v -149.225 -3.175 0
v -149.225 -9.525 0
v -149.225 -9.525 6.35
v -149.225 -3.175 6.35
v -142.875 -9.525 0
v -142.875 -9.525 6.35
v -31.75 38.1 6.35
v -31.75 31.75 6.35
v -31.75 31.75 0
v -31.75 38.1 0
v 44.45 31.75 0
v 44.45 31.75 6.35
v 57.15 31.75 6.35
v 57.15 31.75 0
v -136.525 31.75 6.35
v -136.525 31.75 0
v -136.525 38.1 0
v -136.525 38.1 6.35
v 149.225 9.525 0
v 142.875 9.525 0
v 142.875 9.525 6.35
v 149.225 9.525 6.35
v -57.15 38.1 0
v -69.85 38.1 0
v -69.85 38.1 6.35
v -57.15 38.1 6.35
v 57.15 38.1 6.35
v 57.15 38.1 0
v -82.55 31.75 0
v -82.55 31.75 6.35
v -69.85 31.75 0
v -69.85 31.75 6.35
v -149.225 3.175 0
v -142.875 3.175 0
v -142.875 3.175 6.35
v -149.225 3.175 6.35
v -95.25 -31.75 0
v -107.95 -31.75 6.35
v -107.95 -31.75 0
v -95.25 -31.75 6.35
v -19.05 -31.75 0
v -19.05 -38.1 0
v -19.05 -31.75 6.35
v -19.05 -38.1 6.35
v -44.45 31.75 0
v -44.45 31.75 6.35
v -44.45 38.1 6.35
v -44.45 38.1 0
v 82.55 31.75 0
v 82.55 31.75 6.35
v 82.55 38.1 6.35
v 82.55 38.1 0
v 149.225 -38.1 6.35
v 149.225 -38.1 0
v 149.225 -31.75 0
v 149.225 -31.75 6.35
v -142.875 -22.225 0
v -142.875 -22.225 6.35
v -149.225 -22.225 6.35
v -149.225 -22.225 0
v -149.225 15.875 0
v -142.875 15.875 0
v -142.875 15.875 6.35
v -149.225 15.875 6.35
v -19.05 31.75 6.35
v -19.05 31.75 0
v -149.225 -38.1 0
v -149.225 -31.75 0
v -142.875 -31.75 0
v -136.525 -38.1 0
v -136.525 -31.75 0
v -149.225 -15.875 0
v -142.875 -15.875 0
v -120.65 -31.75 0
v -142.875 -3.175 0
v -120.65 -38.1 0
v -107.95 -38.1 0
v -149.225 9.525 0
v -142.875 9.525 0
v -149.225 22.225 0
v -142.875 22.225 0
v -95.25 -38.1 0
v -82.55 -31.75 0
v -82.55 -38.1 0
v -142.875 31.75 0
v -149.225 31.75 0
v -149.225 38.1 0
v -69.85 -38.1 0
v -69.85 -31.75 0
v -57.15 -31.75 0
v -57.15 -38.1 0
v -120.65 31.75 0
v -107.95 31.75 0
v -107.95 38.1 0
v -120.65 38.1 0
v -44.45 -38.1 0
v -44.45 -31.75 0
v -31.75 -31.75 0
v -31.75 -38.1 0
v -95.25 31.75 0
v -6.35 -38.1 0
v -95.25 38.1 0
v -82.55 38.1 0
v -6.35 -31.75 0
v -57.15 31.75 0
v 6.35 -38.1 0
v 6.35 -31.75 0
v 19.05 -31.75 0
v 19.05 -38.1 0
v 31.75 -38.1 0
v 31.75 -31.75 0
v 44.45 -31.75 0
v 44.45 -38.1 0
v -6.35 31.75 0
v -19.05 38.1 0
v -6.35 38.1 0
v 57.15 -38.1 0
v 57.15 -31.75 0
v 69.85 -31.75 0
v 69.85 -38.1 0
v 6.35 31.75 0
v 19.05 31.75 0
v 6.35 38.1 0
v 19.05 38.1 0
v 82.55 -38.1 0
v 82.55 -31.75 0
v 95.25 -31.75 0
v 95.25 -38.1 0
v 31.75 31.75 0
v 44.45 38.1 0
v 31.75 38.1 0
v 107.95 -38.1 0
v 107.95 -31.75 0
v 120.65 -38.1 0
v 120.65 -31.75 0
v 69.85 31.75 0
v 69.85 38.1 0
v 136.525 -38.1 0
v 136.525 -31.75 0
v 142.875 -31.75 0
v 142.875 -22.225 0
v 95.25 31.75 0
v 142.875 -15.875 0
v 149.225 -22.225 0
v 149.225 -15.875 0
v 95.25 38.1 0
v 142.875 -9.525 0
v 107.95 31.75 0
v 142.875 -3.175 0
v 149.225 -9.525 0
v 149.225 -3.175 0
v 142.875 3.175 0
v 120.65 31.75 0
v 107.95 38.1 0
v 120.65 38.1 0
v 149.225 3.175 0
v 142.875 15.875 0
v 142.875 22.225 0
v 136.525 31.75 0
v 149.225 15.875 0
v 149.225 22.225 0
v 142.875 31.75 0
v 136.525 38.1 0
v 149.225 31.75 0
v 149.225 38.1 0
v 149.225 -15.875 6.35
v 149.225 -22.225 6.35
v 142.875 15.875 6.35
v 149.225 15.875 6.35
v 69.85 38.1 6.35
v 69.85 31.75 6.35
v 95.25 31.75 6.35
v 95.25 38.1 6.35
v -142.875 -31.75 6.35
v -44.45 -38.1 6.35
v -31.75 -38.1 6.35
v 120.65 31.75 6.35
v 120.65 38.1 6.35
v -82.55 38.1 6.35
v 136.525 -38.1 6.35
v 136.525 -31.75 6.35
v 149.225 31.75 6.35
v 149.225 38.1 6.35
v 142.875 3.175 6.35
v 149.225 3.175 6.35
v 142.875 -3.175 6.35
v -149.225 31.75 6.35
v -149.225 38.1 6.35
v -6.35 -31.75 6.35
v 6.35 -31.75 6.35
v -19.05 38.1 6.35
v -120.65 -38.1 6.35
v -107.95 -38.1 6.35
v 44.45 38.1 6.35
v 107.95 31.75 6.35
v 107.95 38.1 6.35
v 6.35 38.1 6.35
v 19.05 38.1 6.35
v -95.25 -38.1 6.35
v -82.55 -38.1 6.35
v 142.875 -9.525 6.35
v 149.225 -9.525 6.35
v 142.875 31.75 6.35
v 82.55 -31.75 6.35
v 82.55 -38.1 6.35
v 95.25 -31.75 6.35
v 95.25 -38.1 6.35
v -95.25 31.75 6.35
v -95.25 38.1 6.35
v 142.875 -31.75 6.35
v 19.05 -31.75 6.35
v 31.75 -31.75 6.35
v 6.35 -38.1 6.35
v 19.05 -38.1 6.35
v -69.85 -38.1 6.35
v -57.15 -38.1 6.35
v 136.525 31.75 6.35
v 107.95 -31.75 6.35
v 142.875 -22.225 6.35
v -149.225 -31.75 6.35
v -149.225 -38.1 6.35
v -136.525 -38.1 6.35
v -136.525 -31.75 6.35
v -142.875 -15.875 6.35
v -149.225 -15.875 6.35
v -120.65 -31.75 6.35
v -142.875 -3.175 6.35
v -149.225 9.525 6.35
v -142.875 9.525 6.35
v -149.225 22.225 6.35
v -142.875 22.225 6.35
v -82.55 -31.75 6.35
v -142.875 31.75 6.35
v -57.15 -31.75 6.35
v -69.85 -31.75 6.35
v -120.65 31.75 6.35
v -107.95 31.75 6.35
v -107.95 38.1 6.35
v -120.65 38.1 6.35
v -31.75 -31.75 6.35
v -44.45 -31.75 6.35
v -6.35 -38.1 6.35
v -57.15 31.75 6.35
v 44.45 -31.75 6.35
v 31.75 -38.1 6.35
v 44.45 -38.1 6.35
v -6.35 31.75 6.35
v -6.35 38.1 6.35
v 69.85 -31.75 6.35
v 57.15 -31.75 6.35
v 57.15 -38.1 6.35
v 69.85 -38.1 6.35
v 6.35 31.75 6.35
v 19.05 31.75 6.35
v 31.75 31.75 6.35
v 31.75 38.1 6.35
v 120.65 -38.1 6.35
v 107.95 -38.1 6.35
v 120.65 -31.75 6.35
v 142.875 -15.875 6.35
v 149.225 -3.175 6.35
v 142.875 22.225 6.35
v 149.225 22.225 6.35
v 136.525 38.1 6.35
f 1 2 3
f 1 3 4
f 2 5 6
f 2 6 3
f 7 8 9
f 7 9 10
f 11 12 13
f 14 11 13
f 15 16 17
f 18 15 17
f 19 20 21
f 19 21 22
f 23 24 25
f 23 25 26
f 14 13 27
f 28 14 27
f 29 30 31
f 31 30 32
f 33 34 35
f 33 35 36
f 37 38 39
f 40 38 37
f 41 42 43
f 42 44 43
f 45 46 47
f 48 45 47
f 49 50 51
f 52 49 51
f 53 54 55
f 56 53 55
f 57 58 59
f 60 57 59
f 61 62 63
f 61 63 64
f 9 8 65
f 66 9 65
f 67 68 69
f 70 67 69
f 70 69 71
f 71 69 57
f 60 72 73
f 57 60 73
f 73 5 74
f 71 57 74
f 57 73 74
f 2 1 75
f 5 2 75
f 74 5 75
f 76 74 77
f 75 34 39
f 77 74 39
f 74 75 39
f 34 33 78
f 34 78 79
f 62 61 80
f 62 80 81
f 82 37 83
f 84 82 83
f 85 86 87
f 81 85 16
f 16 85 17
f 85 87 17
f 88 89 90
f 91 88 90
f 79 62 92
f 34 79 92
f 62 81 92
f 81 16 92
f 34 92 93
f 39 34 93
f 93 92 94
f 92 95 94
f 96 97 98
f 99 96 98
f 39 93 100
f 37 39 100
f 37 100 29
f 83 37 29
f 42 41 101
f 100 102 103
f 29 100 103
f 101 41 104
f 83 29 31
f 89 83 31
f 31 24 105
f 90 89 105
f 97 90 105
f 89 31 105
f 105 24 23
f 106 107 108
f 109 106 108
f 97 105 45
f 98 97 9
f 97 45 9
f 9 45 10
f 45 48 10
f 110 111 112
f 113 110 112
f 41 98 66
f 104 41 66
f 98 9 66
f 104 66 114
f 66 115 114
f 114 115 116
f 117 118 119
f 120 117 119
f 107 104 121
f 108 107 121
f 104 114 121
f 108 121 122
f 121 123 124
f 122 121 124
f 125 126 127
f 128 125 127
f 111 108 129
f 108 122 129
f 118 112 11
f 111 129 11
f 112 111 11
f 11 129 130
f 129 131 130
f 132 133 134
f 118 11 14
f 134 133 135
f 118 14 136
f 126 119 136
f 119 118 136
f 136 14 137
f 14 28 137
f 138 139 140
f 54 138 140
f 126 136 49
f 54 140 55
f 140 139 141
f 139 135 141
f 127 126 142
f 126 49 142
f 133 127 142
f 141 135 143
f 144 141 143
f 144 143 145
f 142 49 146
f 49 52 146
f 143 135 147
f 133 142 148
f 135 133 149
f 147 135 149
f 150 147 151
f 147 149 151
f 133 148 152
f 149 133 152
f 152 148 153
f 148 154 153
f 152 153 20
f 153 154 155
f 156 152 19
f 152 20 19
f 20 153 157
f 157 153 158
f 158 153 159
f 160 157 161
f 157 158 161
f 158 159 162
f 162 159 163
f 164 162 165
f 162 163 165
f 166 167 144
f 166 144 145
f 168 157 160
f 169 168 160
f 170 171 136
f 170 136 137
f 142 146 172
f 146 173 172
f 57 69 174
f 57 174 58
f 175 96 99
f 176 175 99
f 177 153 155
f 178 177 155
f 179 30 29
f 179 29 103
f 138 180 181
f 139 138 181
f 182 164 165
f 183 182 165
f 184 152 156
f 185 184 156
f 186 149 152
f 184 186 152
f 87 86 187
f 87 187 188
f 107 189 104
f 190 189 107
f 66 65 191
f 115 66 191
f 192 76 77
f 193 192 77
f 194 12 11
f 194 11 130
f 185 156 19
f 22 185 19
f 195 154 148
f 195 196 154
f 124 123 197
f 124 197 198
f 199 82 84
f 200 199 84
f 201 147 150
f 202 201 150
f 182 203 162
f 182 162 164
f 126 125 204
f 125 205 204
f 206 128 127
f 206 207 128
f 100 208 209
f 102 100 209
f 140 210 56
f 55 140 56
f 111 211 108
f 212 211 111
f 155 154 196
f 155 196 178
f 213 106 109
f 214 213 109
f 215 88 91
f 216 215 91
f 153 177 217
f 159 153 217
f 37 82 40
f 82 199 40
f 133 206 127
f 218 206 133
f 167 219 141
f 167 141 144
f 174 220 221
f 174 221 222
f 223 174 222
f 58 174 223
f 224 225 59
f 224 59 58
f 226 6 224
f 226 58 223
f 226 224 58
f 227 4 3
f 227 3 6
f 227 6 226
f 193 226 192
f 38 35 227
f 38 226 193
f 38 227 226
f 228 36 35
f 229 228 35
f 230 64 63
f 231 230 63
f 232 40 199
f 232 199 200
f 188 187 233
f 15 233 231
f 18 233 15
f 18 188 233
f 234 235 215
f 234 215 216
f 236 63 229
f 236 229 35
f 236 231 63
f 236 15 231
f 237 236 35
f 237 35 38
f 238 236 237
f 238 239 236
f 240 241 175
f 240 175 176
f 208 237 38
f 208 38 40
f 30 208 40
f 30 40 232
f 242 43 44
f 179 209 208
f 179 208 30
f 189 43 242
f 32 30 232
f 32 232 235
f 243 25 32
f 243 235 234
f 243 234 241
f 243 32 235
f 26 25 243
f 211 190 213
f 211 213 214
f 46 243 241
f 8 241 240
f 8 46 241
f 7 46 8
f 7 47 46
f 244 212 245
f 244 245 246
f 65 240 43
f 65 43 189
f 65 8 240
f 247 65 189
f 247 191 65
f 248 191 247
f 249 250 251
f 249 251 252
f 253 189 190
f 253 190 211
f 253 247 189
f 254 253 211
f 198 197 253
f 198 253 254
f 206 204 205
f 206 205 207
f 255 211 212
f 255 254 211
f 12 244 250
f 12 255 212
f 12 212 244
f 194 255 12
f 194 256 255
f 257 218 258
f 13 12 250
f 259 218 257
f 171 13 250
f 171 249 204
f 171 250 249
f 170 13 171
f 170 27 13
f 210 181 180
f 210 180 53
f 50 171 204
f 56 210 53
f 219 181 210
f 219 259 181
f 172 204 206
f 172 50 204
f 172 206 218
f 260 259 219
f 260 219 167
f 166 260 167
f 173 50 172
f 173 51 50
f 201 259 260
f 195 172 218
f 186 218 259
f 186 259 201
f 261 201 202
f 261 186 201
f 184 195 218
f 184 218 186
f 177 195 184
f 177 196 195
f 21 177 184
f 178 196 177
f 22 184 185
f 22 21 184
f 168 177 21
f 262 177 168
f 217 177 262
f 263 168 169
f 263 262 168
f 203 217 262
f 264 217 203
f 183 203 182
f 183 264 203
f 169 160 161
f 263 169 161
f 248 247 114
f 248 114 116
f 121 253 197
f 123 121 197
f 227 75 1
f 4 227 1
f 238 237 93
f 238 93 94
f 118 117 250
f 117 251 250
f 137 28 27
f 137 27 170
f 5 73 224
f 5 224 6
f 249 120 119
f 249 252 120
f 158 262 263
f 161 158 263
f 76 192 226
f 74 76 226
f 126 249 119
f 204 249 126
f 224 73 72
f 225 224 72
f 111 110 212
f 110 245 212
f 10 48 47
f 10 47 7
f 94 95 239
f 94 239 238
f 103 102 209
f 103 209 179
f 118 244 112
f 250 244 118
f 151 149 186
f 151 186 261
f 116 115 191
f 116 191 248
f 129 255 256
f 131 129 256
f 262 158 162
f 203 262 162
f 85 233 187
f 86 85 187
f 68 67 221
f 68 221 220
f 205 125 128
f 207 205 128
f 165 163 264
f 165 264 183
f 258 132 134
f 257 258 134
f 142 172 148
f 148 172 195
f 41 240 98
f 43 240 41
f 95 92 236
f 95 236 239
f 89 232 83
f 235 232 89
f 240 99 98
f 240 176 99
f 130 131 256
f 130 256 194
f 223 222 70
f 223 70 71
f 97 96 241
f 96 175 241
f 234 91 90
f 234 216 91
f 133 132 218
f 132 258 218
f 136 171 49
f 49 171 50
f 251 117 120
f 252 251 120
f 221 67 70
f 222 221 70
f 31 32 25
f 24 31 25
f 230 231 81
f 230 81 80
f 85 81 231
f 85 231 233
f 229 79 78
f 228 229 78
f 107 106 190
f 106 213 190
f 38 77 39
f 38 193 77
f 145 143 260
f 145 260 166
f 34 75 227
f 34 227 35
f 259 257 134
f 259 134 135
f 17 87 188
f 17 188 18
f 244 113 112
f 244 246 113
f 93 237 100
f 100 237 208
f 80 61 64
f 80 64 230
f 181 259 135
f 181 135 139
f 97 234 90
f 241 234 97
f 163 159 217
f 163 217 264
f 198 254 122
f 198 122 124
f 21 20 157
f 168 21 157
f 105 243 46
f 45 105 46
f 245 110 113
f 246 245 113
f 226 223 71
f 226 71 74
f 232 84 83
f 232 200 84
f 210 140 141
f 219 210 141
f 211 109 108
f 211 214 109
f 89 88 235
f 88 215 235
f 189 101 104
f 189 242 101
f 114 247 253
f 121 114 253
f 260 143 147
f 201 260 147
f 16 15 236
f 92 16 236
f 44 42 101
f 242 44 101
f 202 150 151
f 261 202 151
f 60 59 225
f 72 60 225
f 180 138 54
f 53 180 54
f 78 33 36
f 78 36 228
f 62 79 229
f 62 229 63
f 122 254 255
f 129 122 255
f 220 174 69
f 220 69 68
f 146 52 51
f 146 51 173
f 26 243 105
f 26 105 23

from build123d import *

# Parameters (mm, degrees)
SKETCH1_W               = 298.45
SKETCH1_H               = 76.2
BOSS_EXTRUDE1_DEPTH     = 6.35
SKETCH2_W               = 12.7
SKETCH2_H               = 25.4
CUT_EXTRUDE5_DEPTH      = 155.142898393
LPATTERN1_COUNT         = 9
LPATTERN1_PITCH         = 25.4
MIRROR1_COPY_1_SKETCH_W = 12.7
MIRROR1_COPY_1_SKETCH_H = 25.4
MIRROR1_COPY_1_DEPTH    = 155.142898393
MIRROR1_COPY_2_SKETCH_W = 12.7
MIRROR1_COPY_2_SKETCH_H = 25.4
MIRROR1_COPY_2_DEPTH    = 155.142898393
MIRROR1_COPY_3_SKETCH_W = 12.7
MIRROR1_COPY_3_SKETCH_H = 25.4
MIRROR1_COPY_3_DEPTH    = 155.142898393
MIRROR1_COPY_4_SKETCH_W = 12.7
MIRROR1_COPY_4_SKETCH_H = 25.4
MIRROR1_COPY_4_DEPTH    = 155.142898393
MIRROR1_COPY_5_SKETCH_W = 12.7
MIRROR1_COPY_5_SKETCH_H = 25.4
MIRROR1_COPY_5_DEPTH    = 155.142898393
MIRROR1_COPY_6_SKETCH_W = 12.7
MIRROR1_COPY_6_SKETCH_H = 25.4
MIRROR1_COPY_6_DEPTH    = 155.142898393
MIRROR1_COPY_7_SKETCH_W = 12.7
MIRROR1_COPY_7_SKETCH_H = 25.4
MIRROR1_COPY_7_DEPTH    = 155.142898393
MIRROR1_COPY_8_SKETCH_W = 12.7
MIRROR1_COPY_8_SKETCH_H = 25.4
MIRROR1_COPY_8_DEPTH    = 155.142898393
SKETCH3_W               = 40.748476415
SKETCH3_H               = 6.35
SKETCH3_W_2             = 25.4
SKETCH3_H_2             = 9.525
CUT_EXTRUDE7_DEPTH      = 155.142898393
SKETCH4_W               = 15.875
SKETCH4_H               = 25.4
CUT_EXTRUDE8_DEPTH      = 155.142898393


with BuildPart() as part:
    # Sketch1 → Boss-Extrude1 (new body)
    with BuildSketch(Plane.XY):
        Rectangle(SKETCH1_W, SKETCH1_H)
    extrude(amount=BOSS_EXTRUDE1_DEPTH)

    # Sketch2 → Cut-Extrude5 (cut, symmetric)
    with BuildSketch(Plane.XY):
        with Locations((101.6, -44.45)):
            Rectangle(SKETCH2_W, SKETCH2_H)
    cut_extrude5 = extrude(amount=CUT_EXTRUDE5_DEPTH, both=True, mode=Mode.SUBTRACT)

    # LPattern1: Cut-Extrude5 ×9
    with Locations(*[(-i * LPATTERN1_PITCH, 0, 0) for i in range(1, LPATTERN1_COUNT)]):
        add(cut_extrude5, mode=Mode.SUBTRACT)

    # Mirror1: Cut-Extrude5 across plane
    add(cut_extrude5.mirror(Plane.ZX), mode=Mode.SUBTRACT)

    # Mirror1 copy 1 sketch → Mirror1 copy 1 (cut, symmetric)
    with BuildSketch(Plane(origin=(-25.4, 0, 0), x_dir=(1, 0, 0), z_dir=(0, 0, 1))):
        with Locations((101.6, 44.45)):
            Rectangle(MIRROR1_COPY_1_SKETCH_W, MIRROR1_COPY_1_SKETCH_H)
    extrude(amount=MIRROR1_COPY_1_DEPTH, both=True, mode=Mode.SUBTRACT)

    # Mirror1 copy 2 sketch → Mirror1 copy 2 (cut, symmetric)
    with BuildSketch(Plane(origin=(-50.8, 0, 0), x_dir=(1, 0, 0), z_dir=(0, 0, 1))):
        with Locations((101.6, 44.45)):
            Rectangle(MIRROR1_COPY_2_SKETCH_W, MIRROR1_COPY_2_SKETCH_H)
    extrude(amount=MIRROR1_COPY_2_DEPTH, both=True, mode=Mode.SUBTRACT)

    # Mirror1 copy 3 sketch → Mirror1 copy 3 (cut, symmetric)
    with BuildSketch(Plane(origin=(-76.2, 0, 0), x_dir=(1, 0, 0), z_dir=(0, 0, 1))):
        with Locations((101.6, 44.45)):
            Rectangle(MIRROR1_COPY_3_SKETCH_W, MIRROR1_COPY_3_SKETCH_H)
    extrude(amount=MIRROR1_COPY_3_DEPTH, both=True, mode=Mode.SUBTRACT)

    # Mirror1 copy 4 sketch → Mirror1 copy 4 (cut, symmetric)
    with BuildSketch(Plane(origin=(-101.6, 0, 0), x_dir=(1, 0, 0), z_dir=(0, 0, 1))):
        with Locations((101.6, 44.45)):
            Rectangle(MIRROR1_COPY_4_SKETCH_W, MIRROR1_COPY_4_SKETCH_H)
    extrude(amount=MIRROR1_COPY_4_DEPTH, both=True, mode=Mode.SUBTRACT)

    # Mirror1 copy 5 sketch → Mirror1 copy 5 (cut, symmetric)
    with BuildSketch(Plane(origin=(-127, 0, 0), x_dir=(1, 0, 0), z_dir=(0, 0, 1))):
        with Locations((101.6, 44.45)):
            Rectangle(MIRROR1_COPY_5_SKETCH_W, MIRROR1_COPY_5_SKETCH_H)
    extrude(amount=MIRROR1_COPY_5_DEPTH, both=True, mode=Mode.SUBTRACT)

    # Mirror1 copy 6 sketch → Mirror1 copy 6 (cut, symmetric)
    with BuildSketch(Plane(origin=(-152.4, 0, 0), x_dir=(1, 0, 0), z_dir=(0, 0, 1))):
        with Locations((101.6, 44.45)):
            Rectangle(MIRROR1_COPY_6_SKETCH_W, MIRROR1_COPY_6_SKETCH_H)
    extrude(amount=MIRROR1_COPY_6_DEPTH, both=True, mode=Mode.SUBTRACT)

    # Mirror1 copy 7 sketch → Mirror1 copy 7 (cut, symmetric)
    with BuildSketch(Plane(origin=(-177.8, 0, 0), x_dir=(1, 0, 0), z_dir=(0, 0, 1))):
        with Locations((101.6, 44.45)):
            Rectangle(MIRROR1_COPY_7_SKETCH_W, MIRROR1_COPY_7_SKETCH_H)
    extrude(amount=MIRROR1_COPY_7_DEPTH, both=True, mode=Mode.SUBTRACT)

    # Mirror1 copy 8 sketch → Mirror1 copy 8 (cut, symmetric)
    with BuildSketch(Plane(origin=(-203.2, 0, 0), x_dir=(1, 0, 0), z_dir=(0, 0, 1))):
        with Locations((101.6, 44.45)):
            Rectangle(MIRROR1_COPY_8_SKETCH_W, MIRROR1_COPY_8_SKETCH_H)
    extrude(amount=MIRROR1_COPY_8_DEPTH, both=True, mode=Mode.SUBTRACT)

    # Sketch3 → Cut-Extrude7 (cut, through all)
    with BuildSketch(Plane.XY):
        with Locations((163.249238208, 12.7)):
            Rectangle(SKETCH3_W, SKETCH3_H)
        with Locations((163.249238208, 0)):
            Rectangle(SKETCH3_W, SKETCH3_H)
        with Locations((163.249238208, -12.7)):
            Rectangle(SKETCH3_W, SKETCH3_H)
        with Locations((155.575, 26.9875)):
            Rectangle(SKETCH3_W_2, SKETCH3_H_2)
        with Locations((155.575, -26.9875)):
            Rectangle(SKETCH3_W_2, SKETCH3_H_2)
    cut_extrude7 = extrude(amount=CUT_EXTRUDE7_DEPTH, mode=Mode.SUBTRACT)

    # Mirror2: Cut-Extrude7 across plane
    add(cut_extrude7.mirror(Plane(origin=(0, 0, 0), x_dir=(0, 0, 1), z_dir=(1, 0, 0))), mode=Mode.SUBTRACT)

    # Sketch4 → Cut-Extrude8 (cut, through all)
    with BuildSketch(Plane.XY.offset(6.35)):
        with Locations((128.5875, -44.45)):
            Rectangle(SKETCH4_W, SKETCH4_H)
        with Locations((-128.5875, -44.45)):
            Rectangle(SKETCH4_W, SKETCH4_H)
        with Locations((-128.5875, 44.45)):
            Rectangle(SKETCH4_W, SKETCH4_H)
        with Locations((128.5875, 44.45)):
            Rectangle(SKETCH4_W, SKETCH4_H)
    extrude(amount=-CUT_EXTRUDE8_DEPTH, mode=Mode.SUBTRACT)


solid = part.part
